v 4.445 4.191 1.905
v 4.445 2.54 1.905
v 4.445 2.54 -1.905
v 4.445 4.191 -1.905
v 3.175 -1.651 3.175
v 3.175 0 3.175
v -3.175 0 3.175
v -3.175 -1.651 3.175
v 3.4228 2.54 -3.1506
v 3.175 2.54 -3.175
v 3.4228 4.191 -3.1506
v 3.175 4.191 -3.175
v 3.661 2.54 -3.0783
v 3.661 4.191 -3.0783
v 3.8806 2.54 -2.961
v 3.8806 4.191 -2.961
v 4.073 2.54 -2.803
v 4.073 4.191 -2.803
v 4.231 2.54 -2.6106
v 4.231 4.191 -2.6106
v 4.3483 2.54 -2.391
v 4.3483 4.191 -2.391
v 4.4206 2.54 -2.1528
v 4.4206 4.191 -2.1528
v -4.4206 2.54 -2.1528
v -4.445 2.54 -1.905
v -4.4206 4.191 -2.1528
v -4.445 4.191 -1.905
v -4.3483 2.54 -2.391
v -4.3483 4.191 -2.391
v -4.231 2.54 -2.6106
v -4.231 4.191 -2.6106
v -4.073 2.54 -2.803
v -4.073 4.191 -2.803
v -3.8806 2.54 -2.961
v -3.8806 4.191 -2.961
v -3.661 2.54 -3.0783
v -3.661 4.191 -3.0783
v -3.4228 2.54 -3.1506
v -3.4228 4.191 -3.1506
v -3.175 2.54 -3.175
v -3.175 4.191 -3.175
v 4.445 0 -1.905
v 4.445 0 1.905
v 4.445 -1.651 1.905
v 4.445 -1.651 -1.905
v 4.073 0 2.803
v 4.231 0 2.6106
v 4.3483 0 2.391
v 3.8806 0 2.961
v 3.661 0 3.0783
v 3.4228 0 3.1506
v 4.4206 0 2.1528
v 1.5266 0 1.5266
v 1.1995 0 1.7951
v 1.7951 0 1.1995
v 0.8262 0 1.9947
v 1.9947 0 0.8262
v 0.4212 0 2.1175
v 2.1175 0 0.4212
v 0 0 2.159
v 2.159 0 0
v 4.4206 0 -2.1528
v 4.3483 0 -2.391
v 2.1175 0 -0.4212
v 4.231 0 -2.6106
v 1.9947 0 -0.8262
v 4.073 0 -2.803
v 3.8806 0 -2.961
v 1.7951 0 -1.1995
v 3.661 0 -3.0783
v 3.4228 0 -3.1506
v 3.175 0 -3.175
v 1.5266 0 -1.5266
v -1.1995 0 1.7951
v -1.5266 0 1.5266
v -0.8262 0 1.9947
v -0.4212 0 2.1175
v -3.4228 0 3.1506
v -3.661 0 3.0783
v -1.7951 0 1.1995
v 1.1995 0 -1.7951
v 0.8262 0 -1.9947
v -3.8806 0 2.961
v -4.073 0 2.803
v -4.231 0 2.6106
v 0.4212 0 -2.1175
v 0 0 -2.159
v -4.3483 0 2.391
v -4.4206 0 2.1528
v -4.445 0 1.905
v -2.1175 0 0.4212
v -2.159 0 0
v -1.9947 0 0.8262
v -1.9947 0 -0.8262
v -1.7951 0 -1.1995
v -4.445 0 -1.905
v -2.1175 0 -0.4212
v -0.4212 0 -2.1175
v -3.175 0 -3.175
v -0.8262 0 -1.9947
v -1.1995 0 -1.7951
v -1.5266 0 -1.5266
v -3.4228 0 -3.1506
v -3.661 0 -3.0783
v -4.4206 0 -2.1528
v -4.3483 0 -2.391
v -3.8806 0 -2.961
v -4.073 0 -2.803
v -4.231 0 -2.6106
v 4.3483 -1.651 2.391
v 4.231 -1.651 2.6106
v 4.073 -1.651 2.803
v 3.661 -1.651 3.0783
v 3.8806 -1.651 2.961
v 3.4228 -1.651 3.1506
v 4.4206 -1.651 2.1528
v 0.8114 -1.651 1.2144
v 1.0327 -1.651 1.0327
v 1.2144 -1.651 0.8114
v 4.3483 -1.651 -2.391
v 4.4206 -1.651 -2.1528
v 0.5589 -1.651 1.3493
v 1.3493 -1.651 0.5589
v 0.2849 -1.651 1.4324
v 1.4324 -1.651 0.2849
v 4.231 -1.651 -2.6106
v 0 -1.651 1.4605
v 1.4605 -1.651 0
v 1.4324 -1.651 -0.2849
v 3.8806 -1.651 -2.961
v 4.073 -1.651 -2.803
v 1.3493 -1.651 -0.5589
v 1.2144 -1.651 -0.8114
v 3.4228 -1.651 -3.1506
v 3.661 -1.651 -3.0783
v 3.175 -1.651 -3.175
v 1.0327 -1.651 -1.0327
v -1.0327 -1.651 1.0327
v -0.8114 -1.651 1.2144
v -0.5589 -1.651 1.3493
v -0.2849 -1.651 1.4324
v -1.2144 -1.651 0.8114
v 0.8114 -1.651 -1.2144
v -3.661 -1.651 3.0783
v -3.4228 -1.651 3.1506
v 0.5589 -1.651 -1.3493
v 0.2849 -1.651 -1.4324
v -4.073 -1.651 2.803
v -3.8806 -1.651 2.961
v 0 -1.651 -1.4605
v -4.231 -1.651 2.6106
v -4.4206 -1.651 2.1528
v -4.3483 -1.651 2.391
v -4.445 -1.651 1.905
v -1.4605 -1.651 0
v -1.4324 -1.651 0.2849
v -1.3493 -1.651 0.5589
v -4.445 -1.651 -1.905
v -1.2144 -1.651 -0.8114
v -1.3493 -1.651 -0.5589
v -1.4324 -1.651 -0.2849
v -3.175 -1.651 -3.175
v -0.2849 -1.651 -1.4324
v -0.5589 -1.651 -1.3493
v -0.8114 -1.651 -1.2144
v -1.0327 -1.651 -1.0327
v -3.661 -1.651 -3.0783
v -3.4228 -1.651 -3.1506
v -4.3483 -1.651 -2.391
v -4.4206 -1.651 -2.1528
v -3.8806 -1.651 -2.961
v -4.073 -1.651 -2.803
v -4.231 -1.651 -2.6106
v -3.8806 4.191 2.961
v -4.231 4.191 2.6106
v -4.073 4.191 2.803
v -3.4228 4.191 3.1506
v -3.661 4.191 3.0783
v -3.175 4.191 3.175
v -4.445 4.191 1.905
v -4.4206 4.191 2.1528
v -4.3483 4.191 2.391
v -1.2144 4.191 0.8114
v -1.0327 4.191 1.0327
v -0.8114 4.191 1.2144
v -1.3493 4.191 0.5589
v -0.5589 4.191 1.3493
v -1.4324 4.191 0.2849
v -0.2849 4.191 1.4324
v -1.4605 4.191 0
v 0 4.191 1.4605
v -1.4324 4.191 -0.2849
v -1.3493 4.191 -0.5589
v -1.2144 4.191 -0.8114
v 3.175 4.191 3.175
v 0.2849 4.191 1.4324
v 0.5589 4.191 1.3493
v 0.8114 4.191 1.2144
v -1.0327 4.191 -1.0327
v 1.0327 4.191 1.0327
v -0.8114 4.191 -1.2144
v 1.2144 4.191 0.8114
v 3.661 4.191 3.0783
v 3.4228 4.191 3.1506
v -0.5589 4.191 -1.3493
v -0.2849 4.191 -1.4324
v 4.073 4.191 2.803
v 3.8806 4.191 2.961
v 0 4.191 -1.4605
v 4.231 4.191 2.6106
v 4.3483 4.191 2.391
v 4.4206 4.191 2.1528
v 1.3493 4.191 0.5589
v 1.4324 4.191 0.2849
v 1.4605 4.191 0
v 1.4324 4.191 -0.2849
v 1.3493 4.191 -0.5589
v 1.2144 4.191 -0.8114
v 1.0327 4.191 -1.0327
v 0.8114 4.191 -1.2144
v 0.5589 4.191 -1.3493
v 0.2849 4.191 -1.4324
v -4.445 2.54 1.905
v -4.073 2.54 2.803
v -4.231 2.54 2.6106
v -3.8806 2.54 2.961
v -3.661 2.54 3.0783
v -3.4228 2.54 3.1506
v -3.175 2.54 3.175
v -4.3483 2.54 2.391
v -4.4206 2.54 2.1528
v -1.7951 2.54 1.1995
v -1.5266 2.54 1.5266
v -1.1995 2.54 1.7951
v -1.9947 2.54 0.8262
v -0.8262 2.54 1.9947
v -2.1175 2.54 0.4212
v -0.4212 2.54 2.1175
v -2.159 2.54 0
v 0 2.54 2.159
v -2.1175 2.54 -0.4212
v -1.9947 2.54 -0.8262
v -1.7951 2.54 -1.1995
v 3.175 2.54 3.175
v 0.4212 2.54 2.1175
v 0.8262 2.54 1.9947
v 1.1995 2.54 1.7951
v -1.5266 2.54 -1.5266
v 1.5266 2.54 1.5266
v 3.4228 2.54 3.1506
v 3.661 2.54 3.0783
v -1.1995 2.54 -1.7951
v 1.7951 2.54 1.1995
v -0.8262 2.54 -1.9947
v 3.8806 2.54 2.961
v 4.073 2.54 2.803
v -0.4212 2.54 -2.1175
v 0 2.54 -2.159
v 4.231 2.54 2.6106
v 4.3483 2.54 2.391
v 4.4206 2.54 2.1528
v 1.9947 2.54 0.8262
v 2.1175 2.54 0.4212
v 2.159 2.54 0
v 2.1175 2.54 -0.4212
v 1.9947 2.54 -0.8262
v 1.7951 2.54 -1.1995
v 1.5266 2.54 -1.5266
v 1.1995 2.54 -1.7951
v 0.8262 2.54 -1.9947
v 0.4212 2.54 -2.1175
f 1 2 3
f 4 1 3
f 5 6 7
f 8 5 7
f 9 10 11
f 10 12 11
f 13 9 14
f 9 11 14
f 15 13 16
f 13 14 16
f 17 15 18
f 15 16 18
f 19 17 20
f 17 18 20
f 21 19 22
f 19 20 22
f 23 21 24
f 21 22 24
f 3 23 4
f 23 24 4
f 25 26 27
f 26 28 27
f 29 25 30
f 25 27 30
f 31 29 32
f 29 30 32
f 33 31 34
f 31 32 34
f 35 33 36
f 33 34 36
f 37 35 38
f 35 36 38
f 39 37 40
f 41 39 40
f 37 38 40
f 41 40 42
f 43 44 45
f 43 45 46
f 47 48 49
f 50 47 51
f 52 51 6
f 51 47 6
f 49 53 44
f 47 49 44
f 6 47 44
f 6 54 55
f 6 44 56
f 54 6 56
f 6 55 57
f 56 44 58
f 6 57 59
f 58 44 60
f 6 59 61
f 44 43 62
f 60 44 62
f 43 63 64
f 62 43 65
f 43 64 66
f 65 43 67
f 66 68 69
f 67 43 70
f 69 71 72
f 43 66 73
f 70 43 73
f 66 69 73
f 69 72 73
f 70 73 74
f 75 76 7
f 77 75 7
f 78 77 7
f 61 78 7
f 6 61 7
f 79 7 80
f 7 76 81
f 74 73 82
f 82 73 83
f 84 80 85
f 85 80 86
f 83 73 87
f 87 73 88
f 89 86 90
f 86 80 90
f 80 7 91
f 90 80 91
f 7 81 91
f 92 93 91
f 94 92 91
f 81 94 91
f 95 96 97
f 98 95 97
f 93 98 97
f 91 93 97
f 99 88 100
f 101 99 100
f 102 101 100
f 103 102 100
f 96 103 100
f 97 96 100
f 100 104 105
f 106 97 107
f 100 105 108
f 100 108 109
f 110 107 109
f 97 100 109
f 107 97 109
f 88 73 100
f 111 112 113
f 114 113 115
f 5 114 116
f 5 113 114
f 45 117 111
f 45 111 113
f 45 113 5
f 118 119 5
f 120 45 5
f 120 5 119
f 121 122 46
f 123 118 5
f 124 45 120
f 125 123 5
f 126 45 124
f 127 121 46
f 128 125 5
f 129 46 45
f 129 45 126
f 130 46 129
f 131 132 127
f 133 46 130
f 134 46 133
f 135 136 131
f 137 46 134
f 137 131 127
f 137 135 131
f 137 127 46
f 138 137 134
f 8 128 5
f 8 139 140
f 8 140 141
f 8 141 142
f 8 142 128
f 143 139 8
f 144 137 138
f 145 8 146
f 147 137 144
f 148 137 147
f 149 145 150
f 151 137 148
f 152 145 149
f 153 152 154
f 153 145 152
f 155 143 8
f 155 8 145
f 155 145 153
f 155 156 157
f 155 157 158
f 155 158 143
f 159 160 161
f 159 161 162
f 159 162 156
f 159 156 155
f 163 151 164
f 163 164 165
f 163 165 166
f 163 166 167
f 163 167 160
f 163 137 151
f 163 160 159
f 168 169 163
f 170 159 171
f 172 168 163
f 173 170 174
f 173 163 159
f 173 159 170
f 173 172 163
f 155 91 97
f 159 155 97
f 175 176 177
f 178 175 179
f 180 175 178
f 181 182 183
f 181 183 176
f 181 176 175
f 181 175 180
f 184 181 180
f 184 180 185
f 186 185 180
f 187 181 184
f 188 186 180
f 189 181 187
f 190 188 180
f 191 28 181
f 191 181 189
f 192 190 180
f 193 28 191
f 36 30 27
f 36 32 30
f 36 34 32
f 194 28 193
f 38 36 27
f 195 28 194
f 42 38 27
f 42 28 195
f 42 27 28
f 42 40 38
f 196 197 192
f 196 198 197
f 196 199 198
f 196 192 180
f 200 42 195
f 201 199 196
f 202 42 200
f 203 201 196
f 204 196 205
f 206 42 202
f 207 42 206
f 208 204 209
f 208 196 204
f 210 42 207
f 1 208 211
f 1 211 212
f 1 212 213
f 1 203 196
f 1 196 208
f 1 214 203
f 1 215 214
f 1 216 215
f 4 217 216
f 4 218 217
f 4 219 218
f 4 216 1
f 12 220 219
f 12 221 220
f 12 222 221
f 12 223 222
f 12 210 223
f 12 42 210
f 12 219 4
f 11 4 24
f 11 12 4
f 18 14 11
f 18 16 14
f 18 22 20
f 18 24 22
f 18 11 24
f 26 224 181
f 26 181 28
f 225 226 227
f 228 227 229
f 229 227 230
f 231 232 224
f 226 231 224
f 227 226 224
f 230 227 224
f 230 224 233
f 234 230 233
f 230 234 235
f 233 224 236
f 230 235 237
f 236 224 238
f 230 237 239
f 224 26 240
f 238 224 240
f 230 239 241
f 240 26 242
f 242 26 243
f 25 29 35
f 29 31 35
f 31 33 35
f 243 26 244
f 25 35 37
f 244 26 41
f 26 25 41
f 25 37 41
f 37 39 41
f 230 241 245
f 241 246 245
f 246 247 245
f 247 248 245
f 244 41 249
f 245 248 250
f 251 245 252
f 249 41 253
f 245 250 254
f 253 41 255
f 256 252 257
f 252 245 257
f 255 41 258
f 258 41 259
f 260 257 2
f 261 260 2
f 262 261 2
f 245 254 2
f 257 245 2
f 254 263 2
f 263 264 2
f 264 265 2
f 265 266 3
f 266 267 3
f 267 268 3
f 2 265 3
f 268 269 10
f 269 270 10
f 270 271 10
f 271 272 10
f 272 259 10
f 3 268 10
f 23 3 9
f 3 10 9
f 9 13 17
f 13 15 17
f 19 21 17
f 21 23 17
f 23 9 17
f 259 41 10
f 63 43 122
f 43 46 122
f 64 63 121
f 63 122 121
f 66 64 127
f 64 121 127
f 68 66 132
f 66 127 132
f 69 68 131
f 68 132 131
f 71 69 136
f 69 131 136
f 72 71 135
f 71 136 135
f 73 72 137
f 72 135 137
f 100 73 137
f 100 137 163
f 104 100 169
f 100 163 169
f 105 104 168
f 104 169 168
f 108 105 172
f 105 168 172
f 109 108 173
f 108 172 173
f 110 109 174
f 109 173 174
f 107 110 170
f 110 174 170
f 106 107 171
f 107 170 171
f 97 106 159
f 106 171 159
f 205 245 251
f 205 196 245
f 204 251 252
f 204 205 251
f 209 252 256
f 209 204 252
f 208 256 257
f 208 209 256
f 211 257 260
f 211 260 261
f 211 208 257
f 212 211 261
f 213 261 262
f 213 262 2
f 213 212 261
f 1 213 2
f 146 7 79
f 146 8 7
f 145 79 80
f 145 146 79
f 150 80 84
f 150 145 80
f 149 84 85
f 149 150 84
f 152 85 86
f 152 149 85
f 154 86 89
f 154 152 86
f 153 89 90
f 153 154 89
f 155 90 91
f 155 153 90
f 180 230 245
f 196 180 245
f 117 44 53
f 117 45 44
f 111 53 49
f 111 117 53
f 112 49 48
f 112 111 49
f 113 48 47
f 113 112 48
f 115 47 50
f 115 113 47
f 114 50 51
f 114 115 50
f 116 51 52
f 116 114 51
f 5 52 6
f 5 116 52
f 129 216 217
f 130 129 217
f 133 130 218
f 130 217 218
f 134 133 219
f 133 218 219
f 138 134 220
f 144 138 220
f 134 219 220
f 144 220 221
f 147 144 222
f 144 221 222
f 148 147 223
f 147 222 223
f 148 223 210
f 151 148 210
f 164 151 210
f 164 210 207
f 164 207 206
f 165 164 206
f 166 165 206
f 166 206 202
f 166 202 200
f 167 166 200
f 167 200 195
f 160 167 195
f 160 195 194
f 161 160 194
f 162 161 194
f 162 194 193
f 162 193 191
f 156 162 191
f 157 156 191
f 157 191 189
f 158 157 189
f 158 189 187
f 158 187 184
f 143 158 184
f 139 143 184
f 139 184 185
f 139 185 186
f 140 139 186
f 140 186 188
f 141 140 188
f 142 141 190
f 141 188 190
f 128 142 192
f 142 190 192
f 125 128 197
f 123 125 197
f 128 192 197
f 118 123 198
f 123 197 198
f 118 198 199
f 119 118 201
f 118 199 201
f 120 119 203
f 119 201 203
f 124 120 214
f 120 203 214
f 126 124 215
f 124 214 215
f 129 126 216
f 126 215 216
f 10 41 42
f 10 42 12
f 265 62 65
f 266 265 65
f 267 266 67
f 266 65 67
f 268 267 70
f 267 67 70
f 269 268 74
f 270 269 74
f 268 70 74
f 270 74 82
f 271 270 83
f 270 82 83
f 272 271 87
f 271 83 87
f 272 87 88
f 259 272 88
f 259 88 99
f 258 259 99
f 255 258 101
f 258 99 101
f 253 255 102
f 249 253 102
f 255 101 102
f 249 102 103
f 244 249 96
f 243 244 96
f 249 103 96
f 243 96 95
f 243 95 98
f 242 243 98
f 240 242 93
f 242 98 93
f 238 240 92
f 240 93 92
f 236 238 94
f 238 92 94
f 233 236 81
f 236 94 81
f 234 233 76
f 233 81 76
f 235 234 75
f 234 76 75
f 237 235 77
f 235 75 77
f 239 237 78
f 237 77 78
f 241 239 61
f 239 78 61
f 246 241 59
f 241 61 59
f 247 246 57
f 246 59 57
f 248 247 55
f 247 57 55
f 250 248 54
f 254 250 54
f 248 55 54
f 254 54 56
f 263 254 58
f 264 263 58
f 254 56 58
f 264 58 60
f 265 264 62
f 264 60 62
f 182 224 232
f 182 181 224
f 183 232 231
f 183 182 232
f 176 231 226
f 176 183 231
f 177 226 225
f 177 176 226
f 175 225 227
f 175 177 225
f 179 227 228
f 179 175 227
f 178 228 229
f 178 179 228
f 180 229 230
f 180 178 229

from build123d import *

# Parameters (mm, degrees)
SKETCH1_R           = 2.159
BOSS_EXTRUDE1_DEPTH = 2.54
SKETCH2_W           = 8.89
SKETCH2_H           = 6.35
BOSS_EXTRUDE2_DEPTH = 1.651
SKETCH3_W           = 8.89
SKETCH3_H           = 6.35
BOSS_EXTRUDE3_DEPTH = 1.651
SKETCH4_R           = 1.4605
CUT_EXTRUDE1_DEPTH  = 6.842
FILLET1_R           = 1.27


with BuildPart() as part:
    # Sketch1 → Boss-Extrude1 (new body)
    with BuildSketch(Plane(origin=(0, 0, 0), x_dir=(1, 0, 0), z_dir=(0, 1, 0))):
        Circle(SKETCH1_R)
    extrude(amount=BOSS_EXTRUDE1_DEPTH)

    # Sketch2 → Boss-Extrude2 (add)
    with BuildSketch(Plane(origin=(0, 2.54, 0), x_dir=(1, 0, 0), z_dir=(0, 1, 0))):
        Rectangle(SKETCH2_W, SKETCH2_H)
    extrude(amount=BOSS_EXTRUDE2_DEPTH)

    # Sketch3 → Boss-Extrude3 (add)
    with BuildSketch(Plane(origin=(0, 0, 0), x_dir=(-1, 0, 0), z_dir=(0, -1, 0))):
        Rectangle(SKETCH3_W, SKETCH3_H)
    extrude(amount=BOSS_EXTRUDE3_DEPTH)

    # Sketch4 → Cut-Extrude1 (cut, through all)
    with BuildSketch(Plane(origin=(0, 4.191, 0), x_dir=(1, 0, 0), z_dir=(0, 1, 0))):
        Circle(SKETCH4_R)
    extrude(amount=-CUT_EXTRUDE1_DEPTH, mode=Mode.SUBTRACT)

    # Fillet1
    fillet1_edges = [part.edges().sort_by_distance(p)[0] for p in [
        (-4.445, -0.8255, 3.175),
        (-4.445, -0.8255, -3.175),
        (4.445, -0.8255, -3.175),
        (4.445, -0.8255, 3.175),
        (4.445, 3.3655, 3.175),
        (4.445, 3.3655, -3.175),
        (-4.445, 3.3655, -3.175),
        (-4.445, 3.3655, 3.175),
    ]]
    fillet(fillet1_edges, radius=FILLET1_R)


solid = part.part
